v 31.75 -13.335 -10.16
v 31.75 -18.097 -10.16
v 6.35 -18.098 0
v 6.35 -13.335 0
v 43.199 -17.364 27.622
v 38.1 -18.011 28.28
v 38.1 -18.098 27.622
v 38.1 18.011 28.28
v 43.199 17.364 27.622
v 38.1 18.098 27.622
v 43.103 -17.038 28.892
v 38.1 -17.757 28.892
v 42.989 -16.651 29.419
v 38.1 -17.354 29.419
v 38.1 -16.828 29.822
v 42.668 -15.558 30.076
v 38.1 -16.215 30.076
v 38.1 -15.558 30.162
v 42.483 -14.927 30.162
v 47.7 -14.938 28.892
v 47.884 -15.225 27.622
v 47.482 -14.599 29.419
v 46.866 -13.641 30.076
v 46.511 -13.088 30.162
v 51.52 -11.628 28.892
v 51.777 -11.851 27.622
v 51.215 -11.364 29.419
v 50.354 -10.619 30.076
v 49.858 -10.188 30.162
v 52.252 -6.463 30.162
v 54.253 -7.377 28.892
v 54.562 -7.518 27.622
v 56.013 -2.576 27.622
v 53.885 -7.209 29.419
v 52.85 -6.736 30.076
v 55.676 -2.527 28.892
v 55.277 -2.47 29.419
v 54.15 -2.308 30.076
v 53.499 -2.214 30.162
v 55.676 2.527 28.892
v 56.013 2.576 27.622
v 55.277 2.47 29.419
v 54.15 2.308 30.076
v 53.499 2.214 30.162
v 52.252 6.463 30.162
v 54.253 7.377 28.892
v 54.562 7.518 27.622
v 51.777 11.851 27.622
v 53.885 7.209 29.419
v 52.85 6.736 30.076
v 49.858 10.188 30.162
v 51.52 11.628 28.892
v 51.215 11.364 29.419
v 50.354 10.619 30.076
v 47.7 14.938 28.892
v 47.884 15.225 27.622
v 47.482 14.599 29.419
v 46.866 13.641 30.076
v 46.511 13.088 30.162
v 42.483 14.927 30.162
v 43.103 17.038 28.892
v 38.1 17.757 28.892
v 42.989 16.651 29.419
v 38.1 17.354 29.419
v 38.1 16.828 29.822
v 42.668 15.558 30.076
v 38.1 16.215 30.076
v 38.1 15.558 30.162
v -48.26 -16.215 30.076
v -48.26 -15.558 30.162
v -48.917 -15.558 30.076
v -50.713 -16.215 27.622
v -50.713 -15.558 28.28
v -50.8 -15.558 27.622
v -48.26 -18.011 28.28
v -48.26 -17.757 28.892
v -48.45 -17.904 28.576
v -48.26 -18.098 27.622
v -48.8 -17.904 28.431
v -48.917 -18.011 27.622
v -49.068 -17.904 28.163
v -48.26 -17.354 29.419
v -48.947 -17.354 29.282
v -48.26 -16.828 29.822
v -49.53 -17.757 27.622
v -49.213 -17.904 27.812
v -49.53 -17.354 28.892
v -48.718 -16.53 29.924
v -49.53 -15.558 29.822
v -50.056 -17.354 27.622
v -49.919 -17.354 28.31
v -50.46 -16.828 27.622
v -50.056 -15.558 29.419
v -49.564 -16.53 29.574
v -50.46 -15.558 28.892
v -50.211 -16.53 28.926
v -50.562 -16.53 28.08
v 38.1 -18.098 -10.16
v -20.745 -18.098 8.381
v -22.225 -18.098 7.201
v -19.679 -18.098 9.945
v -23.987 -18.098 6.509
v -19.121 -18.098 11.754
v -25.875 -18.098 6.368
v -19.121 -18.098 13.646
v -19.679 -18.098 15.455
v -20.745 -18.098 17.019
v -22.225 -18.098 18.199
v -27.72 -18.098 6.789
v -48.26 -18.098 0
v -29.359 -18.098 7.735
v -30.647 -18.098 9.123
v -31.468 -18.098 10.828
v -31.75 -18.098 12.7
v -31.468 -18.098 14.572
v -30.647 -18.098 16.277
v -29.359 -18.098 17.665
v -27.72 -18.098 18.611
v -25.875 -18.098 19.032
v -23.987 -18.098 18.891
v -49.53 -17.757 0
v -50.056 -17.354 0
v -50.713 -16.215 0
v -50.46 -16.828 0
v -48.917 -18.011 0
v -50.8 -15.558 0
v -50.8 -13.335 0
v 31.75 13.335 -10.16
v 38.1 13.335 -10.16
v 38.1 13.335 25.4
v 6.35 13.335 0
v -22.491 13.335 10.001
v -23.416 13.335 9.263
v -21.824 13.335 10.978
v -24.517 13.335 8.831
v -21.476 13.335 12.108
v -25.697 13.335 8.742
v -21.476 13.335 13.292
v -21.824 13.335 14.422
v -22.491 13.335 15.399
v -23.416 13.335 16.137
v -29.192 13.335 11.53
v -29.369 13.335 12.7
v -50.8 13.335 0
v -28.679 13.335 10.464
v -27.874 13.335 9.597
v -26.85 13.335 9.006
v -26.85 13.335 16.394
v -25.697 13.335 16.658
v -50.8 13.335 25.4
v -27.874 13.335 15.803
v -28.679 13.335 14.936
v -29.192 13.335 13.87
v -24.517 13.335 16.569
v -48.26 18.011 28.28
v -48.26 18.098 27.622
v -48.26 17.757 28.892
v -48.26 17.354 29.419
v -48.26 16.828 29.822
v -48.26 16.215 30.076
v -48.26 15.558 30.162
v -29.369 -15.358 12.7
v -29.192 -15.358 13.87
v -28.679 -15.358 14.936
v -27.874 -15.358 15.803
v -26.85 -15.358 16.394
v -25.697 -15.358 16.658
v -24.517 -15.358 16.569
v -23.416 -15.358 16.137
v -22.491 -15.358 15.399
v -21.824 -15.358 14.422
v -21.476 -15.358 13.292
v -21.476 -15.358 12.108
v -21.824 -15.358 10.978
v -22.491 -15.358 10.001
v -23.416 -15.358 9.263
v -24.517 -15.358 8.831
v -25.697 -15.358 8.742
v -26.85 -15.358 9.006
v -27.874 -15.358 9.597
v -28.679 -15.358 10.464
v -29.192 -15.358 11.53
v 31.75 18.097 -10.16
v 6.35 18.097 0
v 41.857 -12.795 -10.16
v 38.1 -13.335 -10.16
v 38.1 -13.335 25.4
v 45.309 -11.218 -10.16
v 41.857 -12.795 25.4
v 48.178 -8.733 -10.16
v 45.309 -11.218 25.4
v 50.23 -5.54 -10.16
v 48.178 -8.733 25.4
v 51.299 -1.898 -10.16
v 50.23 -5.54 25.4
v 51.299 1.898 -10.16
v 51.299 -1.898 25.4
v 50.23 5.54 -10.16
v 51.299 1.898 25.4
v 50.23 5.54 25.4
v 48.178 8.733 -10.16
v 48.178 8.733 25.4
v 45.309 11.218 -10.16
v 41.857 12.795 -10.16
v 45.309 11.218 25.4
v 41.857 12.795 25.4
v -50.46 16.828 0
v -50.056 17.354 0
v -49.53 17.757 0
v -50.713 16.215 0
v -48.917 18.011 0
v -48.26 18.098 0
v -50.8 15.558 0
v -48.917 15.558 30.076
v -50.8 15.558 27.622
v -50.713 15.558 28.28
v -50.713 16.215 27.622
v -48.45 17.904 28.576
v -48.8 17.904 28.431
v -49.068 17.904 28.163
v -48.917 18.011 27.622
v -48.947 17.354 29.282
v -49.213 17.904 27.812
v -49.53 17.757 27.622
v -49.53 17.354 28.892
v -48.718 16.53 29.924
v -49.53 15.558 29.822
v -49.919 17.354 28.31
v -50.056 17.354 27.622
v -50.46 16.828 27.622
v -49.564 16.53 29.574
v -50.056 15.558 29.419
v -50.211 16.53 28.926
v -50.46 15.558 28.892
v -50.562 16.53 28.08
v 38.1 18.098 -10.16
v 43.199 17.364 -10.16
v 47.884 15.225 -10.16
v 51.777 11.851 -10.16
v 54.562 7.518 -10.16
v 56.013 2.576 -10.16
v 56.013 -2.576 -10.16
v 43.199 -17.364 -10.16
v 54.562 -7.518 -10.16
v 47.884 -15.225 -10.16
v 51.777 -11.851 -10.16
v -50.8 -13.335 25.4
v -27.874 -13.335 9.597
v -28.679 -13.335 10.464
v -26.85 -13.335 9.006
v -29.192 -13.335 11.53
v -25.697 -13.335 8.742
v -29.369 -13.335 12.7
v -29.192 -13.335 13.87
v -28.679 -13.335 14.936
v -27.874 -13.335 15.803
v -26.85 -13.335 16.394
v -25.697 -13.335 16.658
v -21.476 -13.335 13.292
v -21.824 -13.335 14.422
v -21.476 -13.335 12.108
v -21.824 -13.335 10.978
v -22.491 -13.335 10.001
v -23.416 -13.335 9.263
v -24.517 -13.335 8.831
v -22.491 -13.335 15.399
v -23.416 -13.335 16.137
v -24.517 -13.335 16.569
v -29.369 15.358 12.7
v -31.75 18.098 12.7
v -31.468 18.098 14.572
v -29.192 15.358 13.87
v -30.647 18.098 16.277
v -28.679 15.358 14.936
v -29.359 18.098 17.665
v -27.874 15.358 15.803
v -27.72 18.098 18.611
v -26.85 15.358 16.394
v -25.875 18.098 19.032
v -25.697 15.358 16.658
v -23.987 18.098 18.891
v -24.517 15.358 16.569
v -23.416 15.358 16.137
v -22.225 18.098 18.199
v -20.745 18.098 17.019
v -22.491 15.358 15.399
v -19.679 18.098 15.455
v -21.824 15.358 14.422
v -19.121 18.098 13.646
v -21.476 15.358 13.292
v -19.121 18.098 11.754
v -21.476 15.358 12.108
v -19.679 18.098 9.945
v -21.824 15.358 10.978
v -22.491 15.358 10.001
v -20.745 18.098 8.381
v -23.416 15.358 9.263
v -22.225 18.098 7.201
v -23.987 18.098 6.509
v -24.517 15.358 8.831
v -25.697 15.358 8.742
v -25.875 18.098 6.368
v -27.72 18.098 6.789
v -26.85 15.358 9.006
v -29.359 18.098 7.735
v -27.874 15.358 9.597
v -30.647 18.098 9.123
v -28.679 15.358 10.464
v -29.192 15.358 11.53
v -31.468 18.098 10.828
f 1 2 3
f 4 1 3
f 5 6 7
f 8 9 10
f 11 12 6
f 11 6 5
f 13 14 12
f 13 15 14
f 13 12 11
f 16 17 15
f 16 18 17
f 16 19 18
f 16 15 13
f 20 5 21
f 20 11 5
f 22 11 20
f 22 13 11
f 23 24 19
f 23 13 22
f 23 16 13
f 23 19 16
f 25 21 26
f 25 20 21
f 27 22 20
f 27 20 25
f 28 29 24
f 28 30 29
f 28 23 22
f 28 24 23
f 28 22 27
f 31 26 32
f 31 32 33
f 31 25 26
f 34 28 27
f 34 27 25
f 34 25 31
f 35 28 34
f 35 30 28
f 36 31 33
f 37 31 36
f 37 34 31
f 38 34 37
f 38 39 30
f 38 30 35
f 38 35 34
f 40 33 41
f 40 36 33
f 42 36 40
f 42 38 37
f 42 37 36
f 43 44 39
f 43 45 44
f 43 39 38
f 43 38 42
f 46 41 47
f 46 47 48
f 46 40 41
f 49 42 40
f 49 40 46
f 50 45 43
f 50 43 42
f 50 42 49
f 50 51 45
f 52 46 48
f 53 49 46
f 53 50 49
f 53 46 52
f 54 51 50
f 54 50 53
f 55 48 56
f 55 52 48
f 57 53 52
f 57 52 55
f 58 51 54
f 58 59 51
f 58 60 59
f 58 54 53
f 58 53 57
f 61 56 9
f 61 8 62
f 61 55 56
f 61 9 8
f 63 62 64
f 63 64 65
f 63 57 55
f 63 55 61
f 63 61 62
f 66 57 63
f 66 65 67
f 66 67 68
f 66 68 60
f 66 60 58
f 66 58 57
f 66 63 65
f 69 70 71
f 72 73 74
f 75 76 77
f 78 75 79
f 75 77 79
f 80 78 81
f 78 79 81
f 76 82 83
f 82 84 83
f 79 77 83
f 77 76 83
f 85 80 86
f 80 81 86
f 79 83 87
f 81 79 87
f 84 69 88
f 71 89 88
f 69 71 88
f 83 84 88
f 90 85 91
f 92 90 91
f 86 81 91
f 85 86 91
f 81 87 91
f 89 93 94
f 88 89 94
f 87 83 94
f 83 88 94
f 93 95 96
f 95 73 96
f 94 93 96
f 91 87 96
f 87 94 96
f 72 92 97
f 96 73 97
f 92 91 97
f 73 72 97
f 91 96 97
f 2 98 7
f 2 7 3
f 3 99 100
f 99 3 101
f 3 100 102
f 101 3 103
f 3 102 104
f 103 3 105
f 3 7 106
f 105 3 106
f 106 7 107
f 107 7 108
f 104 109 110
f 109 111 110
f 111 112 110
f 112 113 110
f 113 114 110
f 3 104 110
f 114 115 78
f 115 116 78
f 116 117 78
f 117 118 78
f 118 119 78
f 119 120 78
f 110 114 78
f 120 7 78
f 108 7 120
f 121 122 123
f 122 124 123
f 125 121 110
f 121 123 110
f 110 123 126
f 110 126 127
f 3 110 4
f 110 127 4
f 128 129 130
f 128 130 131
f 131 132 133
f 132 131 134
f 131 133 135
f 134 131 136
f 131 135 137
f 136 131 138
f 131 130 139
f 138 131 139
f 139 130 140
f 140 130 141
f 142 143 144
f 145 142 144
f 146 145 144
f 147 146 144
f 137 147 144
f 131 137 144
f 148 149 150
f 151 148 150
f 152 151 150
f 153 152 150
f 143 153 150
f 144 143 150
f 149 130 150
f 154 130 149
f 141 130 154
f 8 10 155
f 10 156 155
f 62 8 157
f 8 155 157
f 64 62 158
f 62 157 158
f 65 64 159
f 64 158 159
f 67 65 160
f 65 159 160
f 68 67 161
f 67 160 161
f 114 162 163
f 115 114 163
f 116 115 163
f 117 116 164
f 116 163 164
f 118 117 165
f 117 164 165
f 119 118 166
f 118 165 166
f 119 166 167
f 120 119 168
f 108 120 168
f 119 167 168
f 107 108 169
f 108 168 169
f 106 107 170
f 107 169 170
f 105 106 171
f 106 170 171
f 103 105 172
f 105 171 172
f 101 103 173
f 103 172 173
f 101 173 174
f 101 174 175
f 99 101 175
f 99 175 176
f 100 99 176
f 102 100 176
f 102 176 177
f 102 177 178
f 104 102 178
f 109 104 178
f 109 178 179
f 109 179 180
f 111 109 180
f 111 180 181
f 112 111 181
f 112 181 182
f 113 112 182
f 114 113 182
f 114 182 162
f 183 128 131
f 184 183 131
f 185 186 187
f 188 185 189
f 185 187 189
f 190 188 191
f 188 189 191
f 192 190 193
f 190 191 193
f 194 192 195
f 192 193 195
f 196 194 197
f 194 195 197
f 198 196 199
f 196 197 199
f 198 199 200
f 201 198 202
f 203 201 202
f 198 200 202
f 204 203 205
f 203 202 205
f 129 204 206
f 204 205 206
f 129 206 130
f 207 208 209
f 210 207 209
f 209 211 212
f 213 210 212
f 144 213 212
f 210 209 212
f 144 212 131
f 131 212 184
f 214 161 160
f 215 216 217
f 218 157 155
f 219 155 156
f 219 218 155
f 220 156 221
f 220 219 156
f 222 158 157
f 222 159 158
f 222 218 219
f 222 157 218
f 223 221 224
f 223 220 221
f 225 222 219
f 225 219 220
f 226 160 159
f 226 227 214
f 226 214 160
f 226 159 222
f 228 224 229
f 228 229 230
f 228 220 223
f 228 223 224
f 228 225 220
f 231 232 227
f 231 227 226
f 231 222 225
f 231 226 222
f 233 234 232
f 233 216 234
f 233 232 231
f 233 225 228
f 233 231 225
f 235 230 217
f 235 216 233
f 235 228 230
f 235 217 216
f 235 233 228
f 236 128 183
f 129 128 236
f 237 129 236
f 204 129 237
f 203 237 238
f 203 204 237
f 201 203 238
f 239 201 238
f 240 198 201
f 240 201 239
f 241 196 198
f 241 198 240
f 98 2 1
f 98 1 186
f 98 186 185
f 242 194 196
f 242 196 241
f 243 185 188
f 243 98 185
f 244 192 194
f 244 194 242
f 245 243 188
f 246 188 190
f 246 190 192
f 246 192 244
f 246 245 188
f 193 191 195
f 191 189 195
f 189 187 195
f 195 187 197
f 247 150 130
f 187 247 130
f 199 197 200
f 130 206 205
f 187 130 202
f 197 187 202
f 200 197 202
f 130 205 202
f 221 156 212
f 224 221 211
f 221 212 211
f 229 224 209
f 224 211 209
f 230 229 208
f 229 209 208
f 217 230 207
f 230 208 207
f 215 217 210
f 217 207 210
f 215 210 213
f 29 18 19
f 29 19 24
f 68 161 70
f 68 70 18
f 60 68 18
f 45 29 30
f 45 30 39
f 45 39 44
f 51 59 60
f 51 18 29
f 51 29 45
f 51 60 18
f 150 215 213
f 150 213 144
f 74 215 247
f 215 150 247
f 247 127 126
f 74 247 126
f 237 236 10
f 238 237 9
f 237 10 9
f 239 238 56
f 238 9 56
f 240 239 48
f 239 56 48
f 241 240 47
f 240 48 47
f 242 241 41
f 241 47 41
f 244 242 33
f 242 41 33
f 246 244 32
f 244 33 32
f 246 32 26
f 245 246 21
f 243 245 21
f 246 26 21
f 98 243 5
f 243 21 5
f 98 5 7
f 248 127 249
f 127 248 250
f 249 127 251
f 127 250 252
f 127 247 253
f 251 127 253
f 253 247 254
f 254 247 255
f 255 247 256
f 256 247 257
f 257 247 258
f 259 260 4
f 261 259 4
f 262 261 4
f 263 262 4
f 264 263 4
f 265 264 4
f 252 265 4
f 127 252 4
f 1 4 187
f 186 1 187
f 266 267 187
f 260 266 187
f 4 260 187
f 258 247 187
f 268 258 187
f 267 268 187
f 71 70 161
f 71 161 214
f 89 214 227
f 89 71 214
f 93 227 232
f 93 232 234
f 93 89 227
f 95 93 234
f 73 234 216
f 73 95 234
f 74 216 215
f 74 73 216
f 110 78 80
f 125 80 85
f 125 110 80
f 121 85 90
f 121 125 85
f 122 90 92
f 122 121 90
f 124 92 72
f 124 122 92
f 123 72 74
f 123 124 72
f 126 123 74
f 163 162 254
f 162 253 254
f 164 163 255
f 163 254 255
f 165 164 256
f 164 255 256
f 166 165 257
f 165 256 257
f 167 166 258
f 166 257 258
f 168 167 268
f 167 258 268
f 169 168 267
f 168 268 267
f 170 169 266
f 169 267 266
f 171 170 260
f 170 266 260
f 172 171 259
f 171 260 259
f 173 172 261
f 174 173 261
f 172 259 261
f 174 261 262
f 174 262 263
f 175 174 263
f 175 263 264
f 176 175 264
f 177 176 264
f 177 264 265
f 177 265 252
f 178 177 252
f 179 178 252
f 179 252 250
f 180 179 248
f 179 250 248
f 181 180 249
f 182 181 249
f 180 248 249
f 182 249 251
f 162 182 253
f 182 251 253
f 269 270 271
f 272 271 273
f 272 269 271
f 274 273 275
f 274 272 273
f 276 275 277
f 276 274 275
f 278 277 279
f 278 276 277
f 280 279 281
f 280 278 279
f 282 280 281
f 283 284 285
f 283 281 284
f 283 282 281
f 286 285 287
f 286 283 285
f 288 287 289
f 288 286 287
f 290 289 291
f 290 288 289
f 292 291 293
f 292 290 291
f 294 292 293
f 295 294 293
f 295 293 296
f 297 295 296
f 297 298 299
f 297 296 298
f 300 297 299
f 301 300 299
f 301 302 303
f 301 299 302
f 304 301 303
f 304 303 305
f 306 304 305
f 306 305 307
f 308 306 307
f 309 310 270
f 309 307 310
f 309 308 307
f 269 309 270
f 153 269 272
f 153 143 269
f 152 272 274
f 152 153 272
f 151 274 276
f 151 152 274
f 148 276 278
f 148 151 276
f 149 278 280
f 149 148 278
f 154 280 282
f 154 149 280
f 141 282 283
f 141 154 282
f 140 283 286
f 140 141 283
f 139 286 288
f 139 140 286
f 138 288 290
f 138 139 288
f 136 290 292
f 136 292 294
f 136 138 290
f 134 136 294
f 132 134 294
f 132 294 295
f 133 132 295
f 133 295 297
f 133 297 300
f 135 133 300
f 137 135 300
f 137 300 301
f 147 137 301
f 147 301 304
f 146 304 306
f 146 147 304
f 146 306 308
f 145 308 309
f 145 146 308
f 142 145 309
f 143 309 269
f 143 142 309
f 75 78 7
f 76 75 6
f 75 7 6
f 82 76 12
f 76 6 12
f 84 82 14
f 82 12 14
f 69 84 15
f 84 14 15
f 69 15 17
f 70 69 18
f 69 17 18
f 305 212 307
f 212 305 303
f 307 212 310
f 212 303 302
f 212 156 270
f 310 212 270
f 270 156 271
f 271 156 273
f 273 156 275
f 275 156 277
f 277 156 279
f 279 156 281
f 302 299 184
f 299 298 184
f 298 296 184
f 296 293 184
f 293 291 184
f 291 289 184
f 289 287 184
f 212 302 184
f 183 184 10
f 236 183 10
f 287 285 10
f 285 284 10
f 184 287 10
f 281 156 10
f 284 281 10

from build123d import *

# Parameters (mm, degrees)
F1_DEPTH       = 25.4
F3_DEPTH       = 4.7625
F5_D           = 7.9375
F5_DEPTH       = 12.7
F5_CSINK_D     = 12.7
F5_CSINK_ANGLE = 82
F5_TIP         = 2.3846655818
F6_R           = 2.54
F8_DEPTH       = 10.16
F9_T4_DEPTH    = 169.4252160848
F9_T9_DEPTH    = 169.4252160848


# Not quite as in the source:
# - a fillet or chamfer that OpenCascade refuses, or shapes differently, is made with other operations: its cross-section is extruded or revolved along the edge and cut away or added
# - a pattern or mirror of a feature is missing from the dataset's text; its kind, count and spacing are read off the source's solid
# - a feature names something its author has since deleted; it is built from what else it names


with BuildPart() as f1:
    # F0 (on Top) → F1 (new body)
    with BuildSketch(Plane.XY):
        with BuildLine():
            Line((38.1, 18.0975), (-50.8, 18.0975))
            Line((-50.8, 18.0975), (-50.8, 13.335))
            Line((-50.8, 13.335), (38.1, 13.335))
            ThreePointArc((38.1, 13.335), (51.435, 0), (38.1, -13.335))
            Line((38.1, -13.335), (-50.8, -13.335))
            Line((-50.8, -13.335), (-50.8, -18.0975))
            Line((-50.8, -18.0975), (38.1, -18.0975))
            ThreePointArc((38.1, -18.0975), (56.1975, 0), (38.1, 18.0975))
        make_face()
    extrude(amount=F1_DEPTH)

    # F2 (on face) → F3 (join)
    with BuildSketch(Plane.XY.offset(25.4)):
        with BuildLine():
            Line((38.1, 13.335), (-50.8, 13.335))
            Line((-50.8, 13.335), (-50.8, -13.335))
            Line((-50.8, -13.335), (38.1, -13.335))
            ThreePointArc((38.1, -13.335), (51.435, 0), (38.1, 13.335))
        make_face()
        with BuildLine():
            Line((38.1, 18.0975), (-50.8, 18.0975))
            Line((-50.8, 18.0975), (-50.8, 13.335))
            Line((-50.8, 13.335), (38.1, 13.335))
            ThreePointArc((38.1, 13.335), (51.435, 0), (38.1, -13.335))
            Line((38.1, -13.335), (-50.8, -13.335))
            Line((-50.8, -13.335), (-50.8, -18.0975))
            Line((-50.8, -18.0975), (38.1, -18.0975))
            ThreePointArc((38.1, -18.0975), (56.1975, 0), (38.1, 18.0975))
        make_face()
    extrude(amount=F3_DEPTH)

    # F5
    with Locations(Plane.XZ.offset(18.0975)):
        with Locations((-25.4, 12.7)):
            f5 = CounterSinkHole(F5_D / 2, F5_CSINK_D / 2, depth=F5_DEPTH, counter_sink_angle=F5_CSINK_ANGLE)
            with Locations((0, 0, -(F5_DEPTH + F5_TIP / 2))):  # 118° drill point
                Cone(0, F5_D / 2, F5_TIP, mode=Mode.SUBTRACT)

    # F5_copies: F5 across plane
    add(f5.mirror(Plane.ZX), mode=Mode.SUBTRACT)

    # F6
    f6_edges = [f1.edges().sort_by_distance(p)[0] for p in [
        (-50.8, 0, 30.1625),
        (-6.35, 18.0975, 30.1625),
        (-50.8, 18.0975, 15.08125),
        (56.1975, 0, 30.1625),
        (-6.35, -18.0975, 30.1625),
        (-50.8, -18.0975, 15.08125),
    ]]
    fillet(f6_edges, radius=F6_R)

    # F7 (on face) → F8 (join)
    with BuildSketch(Plane(origin=(0, 0, 0), x_dir=(1, 0, 0), z_dir=(0, 0, -1))):
        with BuildLine():
            ThreePointArc((38.1, -18.0975), (56.1975, 0), (38.1, 18.0975))
            Line((38.1, 18.0975), (0, 18.0975))
            Line((0, 18.0975), (0, 13.335))
            Line((0, 13.335), (38.1, 13.335))
            ThreePointArc((38.1, 13.335), (51.435, 0), (38.1, -13.335))
            Line((38.1, -13.335), (0, -13.335))
            Line((0, -13.335), (0, -18.0975))
            Line((0, -18.0975), (38.1, -18.0975))
        make_face()
    extrude(amount=F8_DEPTH)

    # F9: chamfer of 31.75 x 12.7 on 2 edges, made by hand


with BuildPart() as f9_tool2:
    # F9_s3 → F9_t4 (new body)
    with BuildSketch(Plane.XZ.offset(68.9963580424)):
        Polygon((31.75, -10.16), (0, 2.54), (0, -10.16), align=None)
    extrude(amount=-F9_T4_DEPTH)

    split(bisect_by=Plane.XY, keep=Keep.BOTTOM)


with BuildPart() as f1_1:
    add(f1.part)

    # F9_t1: cut F9_tool2
    add(f9_tool2.part, mode=Mode.SUBTRACT)


with BuildPart() as f9_tool7:
    # F9_s8 → F9_t9 (new body)
    with BuildSketch(Plane.XZ.offset(100.4288580424)):
        Polygon((0, 2.54), (31.75, -10.16), (0, -10.16), align=None)
    extrude(amount=-F9_T9_DEPTH)

    split(bisect_by=Plane.XY, keep=Keep.BOTTOM)


with BuildPart() as f1_2:
    add(f1_1.part)

    # F9_t6: cut F9_tool7
    add(f9_tool7.part, mode=Mode.SUBTRACT)


solid = f1_2.part
